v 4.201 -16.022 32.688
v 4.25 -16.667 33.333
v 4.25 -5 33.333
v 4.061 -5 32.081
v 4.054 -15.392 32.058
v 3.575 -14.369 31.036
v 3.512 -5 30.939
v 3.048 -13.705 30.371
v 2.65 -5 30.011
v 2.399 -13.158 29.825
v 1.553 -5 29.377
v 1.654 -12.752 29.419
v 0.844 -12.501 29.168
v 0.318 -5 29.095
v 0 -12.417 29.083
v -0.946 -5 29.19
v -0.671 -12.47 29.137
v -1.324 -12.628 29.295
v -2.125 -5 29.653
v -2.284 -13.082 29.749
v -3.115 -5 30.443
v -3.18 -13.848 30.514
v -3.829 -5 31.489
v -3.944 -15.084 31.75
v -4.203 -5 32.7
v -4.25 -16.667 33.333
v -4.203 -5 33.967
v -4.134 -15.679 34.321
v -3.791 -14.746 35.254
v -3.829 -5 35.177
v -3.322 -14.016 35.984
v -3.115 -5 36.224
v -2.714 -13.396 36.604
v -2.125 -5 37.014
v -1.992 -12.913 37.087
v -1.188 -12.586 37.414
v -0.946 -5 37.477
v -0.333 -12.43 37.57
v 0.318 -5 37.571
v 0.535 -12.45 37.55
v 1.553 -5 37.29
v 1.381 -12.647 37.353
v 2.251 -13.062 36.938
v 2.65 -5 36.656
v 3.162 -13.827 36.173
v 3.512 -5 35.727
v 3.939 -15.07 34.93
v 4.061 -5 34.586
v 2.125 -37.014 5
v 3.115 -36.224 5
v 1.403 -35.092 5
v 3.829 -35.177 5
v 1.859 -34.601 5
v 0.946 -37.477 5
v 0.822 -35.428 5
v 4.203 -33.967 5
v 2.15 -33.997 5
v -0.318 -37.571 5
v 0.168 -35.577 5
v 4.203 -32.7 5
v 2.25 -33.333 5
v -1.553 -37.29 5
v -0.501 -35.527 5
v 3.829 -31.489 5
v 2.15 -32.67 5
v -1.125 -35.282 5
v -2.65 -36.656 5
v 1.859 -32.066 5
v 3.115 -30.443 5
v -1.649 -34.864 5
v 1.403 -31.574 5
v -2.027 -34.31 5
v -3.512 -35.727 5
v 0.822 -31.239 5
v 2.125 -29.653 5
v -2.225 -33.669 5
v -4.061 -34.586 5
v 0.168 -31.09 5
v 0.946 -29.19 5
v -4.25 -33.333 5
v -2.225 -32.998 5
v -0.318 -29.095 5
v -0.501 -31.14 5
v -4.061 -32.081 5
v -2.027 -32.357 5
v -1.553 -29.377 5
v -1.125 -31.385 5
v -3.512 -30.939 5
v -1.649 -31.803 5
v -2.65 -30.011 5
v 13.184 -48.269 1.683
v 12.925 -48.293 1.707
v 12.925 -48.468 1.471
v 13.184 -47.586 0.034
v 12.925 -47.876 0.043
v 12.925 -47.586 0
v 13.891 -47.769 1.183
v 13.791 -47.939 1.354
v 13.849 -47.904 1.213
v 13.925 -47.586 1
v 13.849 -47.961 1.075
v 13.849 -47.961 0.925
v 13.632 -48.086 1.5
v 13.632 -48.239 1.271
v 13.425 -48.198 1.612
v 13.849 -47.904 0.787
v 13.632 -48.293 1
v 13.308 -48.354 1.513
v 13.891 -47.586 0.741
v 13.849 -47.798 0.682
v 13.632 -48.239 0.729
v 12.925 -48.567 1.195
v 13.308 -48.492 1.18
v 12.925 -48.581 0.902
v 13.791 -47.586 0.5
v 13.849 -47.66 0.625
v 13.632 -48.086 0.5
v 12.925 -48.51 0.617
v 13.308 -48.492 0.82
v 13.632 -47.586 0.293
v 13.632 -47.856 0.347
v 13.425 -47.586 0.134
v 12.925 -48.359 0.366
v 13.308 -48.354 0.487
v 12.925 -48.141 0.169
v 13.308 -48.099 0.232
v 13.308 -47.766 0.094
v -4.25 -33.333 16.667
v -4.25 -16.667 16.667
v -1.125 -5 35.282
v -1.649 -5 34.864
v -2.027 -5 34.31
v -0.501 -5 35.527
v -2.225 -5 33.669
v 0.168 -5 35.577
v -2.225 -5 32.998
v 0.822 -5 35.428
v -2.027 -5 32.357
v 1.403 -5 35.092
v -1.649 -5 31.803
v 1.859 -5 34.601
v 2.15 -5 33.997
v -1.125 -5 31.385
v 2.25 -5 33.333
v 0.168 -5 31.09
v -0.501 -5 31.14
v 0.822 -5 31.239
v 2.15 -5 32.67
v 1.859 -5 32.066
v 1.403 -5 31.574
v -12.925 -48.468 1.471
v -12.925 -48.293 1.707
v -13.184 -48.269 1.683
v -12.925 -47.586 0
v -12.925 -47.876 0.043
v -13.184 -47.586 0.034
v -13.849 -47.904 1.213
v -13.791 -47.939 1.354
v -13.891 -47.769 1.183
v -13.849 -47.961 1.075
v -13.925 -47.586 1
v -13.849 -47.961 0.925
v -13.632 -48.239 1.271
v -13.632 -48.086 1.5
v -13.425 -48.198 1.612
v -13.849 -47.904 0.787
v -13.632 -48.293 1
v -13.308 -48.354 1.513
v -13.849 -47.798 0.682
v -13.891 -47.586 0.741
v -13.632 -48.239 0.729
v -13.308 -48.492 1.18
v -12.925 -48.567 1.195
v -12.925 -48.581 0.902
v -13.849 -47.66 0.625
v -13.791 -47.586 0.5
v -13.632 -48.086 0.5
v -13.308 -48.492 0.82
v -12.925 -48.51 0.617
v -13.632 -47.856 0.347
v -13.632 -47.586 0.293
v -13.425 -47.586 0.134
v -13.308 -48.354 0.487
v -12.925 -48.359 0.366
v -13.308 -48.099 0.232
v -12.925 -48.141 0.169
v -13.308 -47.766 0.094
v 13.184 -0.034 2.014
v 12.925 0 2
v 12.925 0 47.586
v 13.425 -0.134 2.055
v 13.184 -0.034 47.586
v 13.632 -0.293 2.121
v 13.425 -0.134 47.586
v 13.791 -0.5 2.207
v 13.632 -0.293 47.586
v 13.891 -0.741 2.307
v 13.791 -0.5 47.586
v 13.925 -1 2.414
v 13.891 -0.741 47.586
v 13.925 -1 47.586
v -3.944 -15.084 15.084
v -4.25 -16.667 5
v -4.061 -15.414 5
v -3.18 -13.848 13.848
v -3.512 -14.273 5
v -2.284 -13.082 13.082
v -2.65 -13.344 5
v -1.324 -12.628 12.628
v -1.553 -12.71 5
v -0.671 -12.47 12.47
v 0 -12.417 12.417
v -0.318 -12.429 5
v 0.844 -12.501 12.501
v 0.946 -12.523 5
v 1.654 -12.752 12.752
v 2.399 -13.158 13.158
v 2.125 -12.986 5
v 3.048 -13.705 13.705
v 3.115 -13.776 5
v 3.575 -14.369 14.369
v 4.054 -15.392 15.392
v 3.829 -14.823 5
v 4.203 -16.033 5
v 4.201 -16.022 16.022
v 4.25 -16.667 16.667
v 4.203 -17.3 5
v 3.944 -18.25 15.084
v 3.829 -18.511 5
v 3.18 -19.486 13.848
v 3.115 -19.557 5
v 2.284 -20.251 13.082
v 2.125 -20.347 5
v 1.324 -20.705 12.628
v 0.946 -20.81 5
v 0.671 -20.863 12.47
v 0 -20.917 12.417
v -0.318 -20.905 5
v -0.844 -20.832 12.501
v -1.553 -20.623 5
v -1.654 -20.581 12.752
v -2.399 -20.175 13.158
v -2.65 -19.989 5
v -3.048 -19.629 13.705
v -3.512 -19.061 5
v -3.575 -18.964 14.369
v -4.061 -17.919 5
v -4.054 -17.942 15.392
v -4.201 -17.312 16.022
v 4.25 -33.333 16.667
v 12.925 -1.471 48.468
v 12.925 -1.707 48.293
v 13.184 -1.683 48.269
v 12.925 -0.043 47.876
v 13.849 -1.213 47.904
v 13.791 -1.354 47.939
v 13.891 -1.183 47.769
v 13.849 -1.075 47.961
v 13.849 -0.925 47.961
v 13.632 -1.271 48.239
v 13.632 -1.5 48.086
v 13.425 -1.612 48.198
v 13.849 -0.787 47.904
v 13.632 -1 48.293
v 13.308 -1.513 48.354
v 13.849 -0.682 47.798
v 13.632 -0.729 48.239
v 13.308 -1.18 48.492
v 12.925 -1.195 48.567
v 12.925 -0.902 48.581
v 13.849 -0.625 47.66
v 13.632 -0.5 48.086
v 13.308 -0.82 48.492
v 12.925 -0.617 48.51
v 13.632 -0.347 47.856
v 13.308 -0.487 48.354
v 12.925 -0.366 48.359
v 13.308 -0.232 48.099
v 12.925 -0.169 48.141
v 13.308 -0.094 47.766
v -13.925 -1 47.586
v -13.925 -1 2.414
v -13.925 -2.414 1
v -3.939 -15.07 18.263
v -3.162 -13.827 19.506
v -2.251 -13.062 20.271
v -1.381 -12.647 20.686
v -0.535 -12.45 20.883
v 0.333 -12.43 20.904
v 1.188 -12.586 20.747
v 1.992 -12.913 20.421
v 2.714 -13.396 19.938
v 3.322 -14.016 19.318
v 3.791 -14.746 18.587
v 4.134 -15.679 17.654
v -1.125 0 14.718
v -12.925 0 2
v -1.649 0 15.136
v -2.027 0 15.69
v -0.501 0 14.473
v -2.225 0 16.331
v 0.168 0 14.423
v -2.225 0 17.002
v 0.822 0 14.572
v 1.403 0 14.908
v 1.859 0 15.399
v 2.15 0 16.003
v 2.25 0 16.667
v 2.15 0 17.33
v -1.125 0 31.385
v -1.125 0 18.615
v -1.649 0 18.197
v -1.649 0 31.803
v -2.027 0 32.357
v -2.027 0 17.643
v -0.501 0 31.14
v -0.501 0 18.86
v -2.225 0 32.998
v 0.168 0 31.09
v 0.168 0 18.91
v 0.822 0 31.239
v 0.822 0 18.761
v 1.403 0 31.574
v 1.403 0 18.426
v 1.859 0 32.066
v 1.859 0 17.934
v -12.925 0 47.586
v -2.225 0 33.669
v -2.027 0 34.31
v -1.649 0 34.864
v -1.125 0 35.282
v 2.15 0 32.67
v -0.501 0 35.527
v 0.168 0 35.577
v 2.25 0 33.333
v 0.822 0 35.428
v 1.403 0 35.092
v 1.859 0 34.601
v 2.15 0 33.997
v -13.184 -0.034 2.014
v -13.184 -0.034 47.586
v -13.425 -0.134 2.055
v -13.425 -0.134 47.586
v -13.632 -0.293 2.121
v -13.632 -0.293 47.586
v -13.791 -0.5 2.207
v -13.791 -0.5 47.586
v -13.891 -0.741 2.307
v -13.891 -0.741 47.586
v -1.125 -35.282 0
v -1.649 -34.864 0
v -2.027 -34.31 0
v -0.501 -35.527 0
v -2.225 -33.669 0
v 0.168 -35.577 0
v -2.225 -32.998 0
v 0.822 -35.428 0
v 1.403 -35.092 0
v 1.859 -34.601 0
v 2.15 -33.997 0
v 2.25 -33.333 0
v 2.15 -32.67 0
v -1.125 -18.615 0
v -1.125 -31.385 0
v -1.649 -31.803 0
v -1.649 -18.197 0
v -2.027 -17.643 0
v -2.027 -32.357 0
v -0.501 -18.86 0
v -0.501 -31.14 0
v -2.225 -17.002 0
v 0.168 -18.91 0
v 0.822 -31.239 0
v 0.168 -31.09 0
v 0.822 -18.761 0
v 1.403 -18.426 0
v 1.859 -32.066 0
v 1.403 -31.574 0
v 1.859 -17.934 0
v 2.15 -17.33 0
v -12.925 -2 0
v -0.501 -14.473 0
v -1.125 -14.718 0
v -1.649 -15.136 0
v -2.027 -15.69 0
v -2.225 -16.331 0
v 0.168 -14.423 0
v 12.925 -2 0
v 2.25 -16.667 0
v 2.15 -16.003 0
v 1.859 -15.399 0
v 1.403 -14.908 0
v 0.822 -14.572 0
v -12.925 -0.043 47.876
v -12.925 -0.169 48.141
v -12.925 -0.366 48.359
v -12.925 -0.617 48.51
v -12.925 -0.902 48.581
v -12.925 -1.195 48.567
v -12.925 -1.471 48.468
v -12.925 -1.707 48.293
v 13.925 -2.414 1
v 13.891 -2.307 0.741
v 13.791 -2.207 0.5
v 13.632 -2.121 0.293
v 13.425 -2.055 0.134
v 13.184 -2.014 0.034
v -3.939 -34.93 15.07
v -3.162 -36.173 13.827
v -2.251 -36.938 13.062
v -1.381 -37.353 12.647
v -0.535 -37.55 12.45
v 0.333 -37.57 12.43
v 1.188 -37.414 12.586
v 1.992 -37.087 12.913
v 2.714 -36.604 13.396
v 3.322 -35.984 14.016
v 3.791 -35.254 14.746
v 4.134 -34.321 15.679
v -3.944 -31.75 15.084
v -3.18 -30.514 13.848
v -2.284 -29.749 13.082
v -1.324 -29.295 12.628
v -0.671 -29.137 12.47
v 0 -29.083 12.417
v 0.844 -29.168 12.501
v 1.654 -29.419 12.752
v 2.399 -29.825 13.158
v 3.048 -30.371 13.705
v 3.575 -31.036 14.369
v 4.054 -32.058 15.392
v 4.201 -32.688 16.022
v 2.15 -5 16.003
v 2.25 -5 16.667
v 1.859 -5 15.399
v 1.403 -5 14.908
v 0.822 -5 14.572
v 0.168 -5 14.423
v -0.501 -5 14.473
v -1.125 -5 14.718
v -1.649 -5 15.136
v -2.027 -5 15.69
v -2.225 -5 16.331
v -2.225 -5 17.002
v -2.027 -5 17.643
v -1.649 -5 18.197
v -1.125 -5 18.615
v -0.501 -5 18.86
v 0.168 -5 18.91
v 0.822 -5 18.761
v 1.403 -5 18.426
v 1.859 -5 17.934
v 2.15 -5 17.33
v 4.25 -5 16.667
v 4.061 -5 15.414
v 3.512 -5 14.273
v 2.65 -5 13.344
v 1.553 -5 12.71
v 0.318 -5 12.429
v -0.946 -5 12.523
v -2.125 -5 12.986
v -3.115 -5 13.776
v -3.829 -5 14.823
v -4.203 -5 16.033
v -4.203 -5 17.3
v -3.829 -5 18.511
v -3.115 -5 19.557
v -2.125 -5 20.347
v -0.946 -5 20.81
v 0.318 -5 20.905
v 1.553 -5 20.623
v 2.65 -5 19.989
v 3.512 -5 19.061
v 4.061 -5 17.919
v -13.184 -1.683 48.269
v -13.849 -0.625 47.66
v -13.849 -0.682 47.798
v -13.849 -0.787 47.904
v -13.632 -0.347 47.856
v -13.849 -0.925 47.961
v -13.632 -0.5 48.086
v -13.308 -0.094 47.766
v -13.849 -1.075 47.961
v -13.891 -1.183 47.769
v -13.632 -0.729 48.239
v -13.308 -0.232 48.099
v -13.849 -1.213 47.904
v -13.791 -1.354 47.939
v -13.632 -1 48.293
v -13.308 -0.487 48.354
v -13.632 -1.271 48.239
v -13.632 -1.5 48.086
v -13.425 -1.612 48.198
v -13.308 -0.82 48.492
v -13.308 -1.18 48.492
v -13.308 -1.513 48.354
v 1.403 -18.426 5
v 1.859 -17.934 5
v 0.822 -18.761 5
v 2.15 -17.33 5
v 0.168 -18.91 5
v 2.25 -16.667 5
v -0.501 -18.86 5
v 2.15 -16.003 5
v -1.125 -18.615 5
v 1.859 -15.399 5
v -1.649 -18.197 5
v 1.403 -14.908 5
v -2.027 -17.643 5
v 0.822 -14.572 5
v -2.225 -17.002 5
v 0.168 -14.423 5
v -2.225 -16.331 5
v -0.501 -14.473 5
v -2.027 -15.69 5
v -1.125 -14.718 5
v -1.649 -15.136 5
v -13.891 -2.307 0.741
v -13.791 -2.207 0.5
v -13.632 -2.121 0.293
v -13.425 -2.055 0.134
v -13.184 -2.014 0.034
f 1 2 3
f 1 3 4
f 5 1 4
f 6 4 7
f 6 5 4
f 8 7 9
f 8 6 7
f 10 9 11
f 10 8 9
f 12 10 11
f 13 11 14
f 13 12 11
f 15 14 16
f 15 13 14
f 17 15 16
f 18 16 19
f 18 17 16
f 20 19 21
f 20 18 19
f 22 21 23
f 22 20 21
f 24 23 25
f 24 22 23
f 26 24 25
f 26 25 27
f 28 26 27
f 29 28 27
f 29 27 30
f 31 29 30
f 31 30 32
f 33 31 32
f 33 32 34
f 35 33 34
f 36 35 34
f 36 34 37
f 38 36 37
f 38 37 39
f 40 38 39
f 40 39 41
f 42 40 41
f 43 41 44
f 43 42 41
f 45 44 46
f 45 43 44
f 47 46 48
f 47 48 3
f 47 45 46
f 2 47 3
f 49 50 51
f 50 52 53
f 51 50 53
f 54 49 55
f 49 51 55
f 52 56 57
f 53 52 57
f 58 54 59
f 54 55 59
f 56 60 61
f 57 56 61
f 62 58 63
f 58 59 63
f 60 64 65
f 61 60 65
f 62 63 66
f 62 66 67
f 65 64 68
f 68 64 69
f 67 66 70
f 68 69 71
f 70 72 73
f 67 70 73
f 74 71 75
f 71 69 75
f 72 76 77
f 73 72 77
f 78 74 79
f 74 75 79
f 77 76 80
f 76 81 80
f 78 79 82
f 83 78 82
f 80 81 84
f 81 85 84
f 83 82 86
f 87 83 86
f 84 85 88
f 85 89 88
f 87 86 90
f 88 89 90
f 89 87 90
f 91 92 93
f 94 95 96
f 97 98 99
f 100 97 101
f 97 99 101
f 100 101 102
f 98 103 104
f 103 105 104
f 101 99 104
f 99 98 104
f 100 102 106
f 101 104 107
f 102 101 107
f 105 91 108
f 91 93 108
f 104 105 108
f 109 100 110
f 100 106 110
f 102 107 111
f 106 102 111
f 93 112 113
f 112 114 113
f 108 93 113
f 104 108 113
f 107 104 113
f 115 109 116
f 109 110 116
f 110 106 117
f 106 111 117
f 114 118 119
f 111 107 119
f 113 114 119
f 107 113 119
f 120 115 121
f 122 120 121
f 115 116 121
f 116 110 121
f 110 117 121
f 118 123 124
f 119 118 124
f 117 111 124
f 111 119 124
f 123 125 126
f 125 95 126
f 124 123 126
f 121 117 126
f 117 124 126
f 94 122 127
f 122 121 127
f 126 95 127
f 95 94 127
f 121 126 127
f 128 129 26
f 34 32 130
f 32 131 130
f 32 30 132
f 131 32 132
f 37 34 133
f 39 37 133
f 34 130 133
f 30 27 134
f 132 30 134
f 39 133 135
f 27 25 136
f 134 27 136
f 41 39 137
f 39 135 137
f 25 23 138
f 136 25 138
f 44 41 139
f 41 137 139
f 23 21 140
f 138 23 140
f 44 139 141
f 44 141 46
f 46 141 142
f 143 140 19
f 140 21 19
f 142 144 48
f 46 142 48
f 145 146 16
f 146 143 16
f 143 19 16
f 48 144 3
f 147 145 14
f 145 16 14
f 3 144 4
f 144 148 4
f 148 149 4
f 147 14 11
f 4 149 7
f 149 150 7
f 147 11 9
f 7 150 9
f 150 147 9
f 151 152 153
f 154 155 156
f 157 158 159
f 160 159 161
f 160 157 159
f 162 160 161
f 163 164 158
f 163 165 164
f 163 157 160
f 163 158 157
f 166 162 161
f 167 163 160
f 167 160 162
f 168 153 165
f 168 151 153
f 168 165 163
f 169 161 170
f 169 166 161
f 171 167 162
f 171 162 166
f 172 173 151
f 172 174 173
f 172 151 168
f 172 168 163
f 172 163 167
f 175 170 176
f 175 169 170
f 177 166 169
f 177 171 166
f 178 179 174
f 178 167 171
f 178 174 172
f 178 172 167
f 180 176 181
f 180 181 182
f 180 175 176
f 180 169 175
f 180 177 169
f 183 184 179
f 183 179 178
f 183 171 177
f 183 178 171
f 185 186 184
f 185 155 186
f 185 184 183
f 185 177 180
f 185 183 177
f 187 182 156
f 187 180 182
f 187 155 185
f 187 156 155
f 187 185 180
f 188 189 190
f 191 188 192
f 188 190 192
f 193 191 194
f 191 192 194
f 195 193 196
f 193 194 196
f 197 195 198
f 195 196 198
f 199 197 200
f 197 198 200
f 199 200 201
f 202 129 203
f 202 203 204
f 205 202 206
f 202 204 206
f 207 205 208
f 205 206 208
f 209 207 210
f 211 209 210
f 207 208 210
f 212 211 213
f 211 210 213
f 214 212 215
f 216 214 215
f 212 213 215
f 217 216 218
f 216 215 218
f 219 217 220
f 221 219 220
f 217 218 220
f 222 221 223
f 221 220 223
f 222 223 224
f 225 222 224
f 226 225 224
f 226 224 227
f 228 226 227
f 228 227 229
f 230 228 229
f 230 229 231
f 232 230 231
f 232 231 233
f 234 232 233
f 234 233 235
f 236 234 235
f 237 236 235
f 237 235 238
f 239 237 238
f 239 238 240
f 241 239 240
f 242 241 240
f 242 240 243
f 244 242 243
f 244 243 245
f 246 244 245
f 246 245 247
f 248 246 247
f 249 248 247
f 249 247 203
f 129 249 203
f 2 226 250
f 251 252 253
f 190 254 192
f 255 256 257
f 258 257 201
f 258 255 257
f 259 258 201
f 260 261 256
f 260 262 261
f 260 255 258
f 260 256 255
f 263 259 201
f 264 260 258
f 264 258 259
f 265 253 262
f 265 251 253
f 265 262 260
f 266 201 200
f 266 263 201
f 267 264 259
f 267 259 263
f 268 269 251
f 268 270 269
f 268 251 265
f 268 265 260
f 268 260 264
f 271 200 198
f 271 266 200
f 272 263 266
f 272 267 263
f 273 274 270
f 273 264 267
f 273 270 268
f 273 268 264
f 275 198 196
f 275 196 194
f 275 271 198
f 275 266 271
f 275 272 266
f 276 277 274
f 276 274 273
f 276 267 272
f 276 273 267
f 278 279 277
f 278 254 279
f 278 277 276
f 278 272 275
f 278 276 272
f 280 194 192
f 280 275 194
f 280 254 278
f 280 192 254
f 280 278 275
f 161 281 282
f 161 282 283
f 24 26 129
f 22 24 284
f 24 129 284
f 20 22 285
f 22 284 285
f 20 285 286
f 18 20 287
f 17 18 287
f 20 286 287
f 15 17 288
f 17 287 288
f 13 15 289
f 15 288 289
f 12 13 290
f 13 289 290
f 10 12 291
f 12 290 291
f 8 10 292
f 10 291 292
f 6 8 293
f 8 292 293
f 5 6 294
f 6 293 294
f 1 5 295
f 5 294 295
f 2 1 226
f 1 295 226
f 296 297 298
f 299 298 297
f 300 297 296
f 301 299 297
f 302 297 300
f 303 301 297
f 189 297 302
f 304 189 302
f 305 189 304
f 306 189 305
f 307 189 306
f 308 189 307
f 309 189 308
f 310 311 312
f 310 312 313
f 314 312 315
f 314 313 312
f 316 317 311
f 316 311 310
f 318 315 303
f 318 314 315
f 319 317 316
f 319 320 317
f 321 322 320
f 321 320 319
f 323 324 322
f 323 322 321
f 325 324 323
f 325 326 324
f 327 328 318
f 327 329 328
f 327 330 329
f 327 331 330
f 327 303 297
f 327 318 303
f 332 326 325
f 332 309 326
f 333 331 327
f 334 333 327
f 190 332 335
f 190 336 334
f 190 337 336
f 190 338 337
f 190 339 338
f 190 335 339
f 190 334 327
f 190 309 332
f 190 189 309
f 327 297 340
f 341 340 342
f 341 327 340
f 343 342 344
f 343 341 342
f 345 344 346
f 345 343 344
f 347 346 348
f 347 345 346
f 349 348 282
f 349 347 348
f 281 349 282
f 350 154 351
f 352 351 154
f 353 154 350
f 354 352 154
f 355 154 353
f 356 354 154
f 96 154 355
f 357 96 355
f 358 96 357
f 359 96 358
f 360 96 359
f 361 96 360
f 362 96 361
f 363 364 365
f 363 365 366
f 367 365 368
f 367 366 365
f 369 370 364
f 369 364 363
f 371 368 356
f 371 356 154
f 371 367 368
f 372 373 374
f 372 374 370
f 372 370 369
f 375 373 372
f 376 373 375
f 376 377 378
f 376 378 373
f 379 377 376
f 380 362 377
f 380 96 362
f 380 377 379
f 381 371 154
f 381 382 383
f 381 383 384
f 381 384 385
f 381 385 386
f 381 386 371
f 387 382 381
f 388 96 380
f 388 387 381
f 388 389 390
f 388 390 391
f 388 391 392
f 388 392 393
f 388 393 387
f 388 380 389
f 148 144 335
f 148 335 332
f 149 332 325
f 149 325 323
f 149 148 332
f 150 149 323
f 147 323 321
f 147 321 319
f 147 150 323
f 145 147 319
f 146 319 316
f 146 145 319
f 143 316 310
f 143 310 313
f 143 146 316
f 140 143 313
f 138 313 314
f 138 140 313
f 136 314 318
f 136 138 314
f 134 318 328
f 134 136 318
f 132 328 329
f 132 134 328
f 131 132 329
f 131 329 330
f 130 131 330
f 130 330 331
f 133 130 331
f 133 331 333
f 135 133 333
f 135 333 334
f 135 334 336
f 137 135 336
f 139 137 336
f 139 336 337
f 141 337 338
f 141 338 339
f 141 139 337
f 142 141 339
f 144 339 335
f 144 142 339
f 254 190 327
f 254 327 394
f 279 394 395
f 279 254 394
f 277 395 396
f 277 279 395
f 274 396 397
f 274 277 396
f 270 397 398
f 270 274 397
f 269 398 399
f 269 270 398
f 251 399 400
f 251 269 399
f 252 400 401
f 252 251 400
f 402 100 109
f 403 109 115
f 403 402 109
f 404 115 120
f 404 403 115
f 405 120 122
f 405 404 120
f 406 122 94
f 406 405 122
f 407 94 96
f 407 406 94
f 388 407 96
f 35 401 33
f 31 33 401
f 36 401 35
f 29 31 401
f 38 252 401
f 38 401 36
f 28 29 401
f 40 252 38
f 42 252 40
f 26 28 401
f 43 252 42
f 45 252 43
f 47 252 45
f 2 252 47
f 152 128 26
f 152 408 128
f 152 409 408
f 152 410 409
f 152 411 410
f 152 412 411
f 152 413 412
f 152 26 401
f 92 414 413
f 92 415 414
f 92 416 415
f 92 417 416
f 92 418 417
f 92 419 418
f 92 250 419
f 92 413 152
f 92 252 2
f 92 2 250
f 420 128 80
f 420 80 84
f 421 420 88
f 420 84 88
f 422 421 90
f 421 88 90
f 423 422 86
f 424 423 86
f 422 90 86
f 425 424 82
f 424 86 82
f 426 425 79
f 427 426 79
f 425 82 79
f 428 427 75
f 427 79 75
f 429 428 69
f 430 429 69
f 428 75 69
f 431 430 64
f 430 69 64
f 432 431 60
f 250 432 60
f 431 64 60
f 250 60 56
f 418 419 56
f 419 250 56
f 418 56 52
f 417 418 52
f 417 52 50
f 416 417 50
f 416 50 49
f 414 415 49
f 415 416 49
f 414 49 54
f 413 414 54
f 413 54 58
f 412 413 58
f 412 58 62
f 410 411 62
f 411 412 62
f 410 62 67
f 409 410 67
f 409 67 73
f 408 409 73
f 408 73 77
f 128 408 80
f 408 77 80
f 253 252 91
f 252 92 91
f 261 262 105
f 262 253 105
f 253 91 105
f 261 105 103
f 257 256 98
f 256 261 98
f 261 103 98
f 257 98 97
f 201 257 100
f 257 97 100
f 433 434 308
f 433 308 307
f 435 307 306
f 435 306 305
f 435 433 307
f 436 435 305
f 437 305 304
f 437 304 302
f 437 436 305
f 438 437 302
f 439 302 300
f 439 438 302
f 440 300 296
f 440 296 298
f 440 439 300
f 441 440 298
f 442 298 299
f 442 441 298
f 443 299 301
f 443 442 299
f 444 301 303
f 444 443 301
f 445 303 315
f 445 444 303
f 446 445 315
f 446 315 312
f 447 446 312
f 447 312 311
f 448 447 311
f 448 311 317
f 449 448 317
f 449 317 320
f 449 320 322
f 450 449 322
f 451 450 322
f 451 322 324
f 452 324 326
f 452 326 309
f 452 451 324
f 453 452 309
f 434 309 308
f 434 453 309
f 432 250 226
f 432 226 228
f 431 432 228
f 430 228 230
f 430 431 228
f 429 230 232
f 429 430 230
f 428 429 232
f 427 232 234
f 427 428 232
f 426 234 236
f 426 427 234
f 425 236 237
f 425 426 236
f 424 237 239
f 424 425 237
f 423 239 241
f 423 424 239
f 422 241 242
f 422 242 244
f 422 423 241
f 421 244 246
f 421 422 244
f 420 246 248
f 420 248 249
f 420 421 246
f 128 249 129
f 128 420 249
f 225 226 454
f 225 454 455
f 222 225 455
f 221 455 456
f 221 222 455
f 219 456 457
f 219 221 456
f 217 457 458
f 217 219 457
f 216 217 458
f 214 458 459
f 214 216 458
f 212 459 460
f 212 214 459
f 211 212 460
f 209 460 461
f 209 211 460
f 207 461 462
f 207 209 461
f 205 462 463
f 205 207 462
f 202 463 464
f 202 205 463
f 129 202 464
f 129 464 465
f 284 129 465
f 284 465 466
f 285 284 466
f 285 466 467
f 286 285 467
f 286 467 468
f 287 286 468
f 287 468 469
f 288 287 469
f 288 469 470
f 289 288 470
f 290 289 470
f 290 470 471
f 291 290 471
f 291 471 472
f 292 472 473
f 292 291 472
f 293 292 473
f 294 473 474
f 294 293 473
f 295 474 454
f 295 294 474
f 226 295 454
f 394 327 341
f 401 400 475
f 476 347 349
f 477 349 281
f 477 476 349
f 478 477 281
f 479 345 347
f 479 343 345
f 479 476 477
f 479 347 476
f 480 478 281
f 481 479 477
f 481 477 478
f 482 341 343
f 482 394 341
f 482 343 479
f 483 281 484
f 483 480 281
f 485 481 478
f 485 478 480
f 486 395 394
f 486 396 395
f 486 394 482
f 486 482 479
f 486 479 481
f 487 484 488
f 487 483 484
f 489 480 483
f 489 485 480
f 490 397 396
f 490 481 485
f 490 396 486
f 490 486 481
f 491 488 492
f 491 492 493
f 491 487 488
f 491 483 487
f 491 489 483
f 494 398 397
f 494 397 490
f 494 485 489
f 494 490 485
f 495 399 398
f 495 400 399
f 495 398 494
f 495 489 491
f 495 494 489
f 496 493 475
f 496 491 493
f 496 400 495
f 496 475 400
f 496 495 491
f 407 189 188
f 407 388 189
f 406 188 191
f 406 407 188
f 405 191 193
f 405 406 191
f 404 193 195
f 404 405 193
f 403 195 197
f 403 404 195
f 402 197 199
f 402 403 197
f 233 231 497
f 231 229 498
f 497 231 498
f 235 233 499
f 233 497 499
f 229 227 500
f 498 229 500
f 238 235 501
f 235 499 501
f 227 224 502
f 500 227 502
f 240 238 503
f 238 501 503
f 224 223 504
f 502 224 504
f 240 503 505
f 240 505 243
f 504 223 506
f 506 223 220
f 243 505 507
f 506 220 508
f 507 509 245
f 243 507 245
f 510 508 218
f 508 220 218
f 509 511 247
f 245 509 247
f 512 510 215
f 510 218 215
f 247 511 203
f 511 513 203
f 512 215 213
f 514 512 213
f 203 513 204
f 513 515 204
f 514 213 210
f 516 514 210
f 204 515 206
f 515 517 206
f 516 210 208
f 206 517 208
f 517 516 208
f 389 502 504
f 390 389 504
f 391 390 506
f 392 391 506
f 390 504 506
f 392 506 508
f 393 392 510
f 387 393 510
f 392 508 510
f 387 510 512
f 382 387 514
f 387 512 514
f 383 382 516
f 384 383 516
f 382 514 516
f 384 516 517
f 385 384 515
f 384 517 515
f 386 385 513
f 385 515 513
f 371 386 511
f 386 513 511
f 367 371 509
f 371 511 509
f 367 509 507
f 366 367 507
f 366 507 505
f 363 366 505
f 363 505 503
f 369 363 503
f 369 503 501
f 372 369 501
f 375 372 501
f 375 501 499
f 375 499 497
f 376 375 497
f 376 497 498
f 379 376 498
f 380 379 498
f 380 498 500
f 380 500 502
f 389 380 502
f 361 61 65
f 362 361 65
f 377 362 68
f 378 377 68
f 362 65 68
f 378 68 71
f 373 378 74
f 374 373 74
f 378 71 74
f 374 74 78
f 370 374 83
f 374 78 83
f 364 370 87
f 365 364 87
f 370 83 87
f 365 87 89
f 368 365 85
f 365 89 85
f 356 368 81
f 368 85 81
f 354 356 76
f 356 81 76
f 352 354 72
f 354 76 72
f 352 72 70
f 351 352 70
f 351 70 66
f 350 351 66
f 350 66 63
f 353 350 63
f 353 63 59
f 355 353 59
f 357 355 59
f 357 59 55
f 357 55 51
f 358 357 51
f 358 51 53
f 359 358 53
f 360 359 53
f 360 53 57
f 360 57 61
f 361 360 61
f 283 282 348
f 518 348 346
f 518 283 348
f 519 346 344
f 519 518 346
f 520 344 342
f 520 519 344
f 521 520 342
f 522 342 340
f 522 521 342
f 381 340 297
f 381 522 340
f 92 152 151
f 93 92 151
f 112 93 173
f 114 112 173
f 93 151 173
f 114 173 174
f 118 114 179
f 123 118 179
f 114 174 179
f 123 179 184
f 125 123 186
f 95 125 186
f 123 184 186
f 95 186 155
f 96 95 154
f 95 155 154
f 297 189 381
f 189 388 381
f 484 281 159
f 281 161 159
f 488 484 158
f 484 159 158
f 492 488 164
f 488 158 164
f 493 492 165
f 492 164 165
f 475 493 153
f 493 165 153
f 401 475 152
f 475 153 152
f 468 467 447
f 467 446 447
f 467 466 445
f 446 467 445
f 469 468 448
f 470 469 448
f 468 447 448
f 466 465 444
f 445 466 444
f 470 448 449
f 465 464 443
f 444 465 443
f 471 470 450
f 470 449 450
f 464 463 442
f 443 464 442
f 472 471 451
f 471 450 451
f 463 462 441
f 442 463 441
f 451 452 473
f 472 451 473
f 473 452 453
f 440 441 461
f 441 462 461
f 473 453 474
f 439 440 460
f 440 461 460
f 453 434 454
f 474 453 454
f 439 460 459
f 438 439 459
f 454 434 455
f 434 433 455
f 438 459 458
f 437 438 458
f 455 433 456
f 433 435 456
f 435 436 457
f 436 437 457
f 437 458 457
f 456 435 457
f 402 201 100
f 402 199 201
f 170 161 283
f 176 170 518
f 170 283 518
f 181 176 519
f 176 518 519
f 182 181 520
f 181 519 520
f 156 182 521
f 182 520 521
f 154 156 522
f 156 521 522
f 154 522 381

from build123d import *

# Parameters (mm, degrees)
BOSS_EXTRUDE1_DEPTH  = 13.925
M4_CLEARANCE_HOLE1_D = 4.5
CUT_EXTRUDE1_START   = -5
SKETCH7_R            = 4.25
CUT_EXTRUDE1_DEPTH   = 62
CHAMFER1_SIZE        = 2
MIRROR1_START        = -33.333333
MIRROR1_OUTLINE_R    = 4.25
MIRROR1_DEPTH        = 28.333333
MIRROR1_START_2      = -5
MIRROR1_2_OUTLINE_R  = 2.25
MIRROR1_2_DEPTH      = 5
CUT_EXTRUDE4_START   = -18.175
CUT_EXTRUDE4_DEPTH   = 8.5
FILLET1_R            = 1


# Read off the part's stored shape, not the designer's step: Mirror1
with BuildPart() as part:
    # Sketch1 → Boss-Extrude1 (new, symmetric)
    with BuildSketch(Plane(origin=(0, 0, 0), x_dir=(0, 0, -1), z_dir=(1, 0, 0))):
        Polygon((0, 0), (-50, 0), (0, -50), align=None)
    extrude(amount=BOSS_EXTRUDE1_DEPTH, both=True)

    # M4 Clearance Hole1 (through all)
    with Locations(Plane(origin=(0, 0, 0), x_dir=(-1, 0, 0), z_dir=(0, 0, -1))):
        with Locations((0, -16.666667), (0, -33.333333)):
            Hole(M4_CLEARANCE_HOLE1_D / 2)

    # Sketch7 → Cut-Extrude1 (cut)
    with BuildSketch(Plane(origin=(0, 0, 0), x_dir=(-1, 0, 0), z_dir=(0, 0, -1)).offset(CUT_EXTRUDE1_START)):
        with Locations((0, -16.666667)):
            Circle(SKETCH7_R)
        with Locations((0, -33.333333)):
            Circle(SKETCH7_R)
    extrude(amount=-CUT_EXTRUDE1_DEPTH, mode=Mode.SUBTRACT)

    # Chamfer1
    chamfer1_edges = [part.edges().sort_by_distance(p)[0] for p in [
        (0, 0, 0),
    ]]
    chamfer(chamfer1_edges, length=CHAMFER1_SIZE)

    # Mirror1 outline → Mirror1 (cut)
    with BuildSketch(Plane(origin=(0, 0, 0), x_dir=(1, 0, 0), z_dir=(0, 1, 0)).offset(MIRROR1_START)):
        with Locations((0, -33.333333)):
            Circle(MIRROR1_OUTLINE_R)
        with Locations((0, -16.666667)):
            Circle(MIRROR1_OUTLINE_R)
    extrude(amount=MIRROR1_DEPTH, mode=Mode.SUBTRACT)

    # Mirror1 2 outline → Mirror1 2 (cut)
    with BuildSketch(Plane(origin=(0, 0, 0), x_dir=(1, 0, 0), z_dir=(0, 1, 0)).offset(MIRROR1_START_2)):
        with Locations((0, -33.333333)):
            Circle(MIRROR1_2_OUTLINE_R)
        with Locations((0, -16.666667)):
            Circle(MIRROR1_2_OUTLINE_R)
    extrude(amount=MIRROR1_2_DEPTH, mode=Mode.SUBTRACT)

    # Sketch8 → Cut-Extrude4 (cut)
    with BuildSketch(Plane(origin=(13.925, 0, 0), x_dir=(0, 0, -1), z_dir=(1, 0, 0)).offset(CUT_EXTRUDE4_START)):
        Polygon((-33.333333, -16.666667), (-16.666667, -16.666667), (-16.666667, -33.333333), align=None)
    extrude(amount=CUT_EXTRUDE4_DEPTH, mode=Mode.SUBTRACT)

    # Fillet1
    fillet1_edges = [part.edges().sort_by_distance(p)[0] for p in [
        (13.925, -25, 25),
        (-13.925, 0, 26),
        (13.925, 0, 26),
        (-13.925, -1, 1),
        (-13.925, -25, 25),
        (13.925, -1, 1),
        (-13.925, -26, 0),
        (13.925, -26, 0),
        (0, -50, 0),
        (0, 0, 50),
    ]]
    fillet(fillet1_edges, radius=FILLET1_R)


solid = part.part
